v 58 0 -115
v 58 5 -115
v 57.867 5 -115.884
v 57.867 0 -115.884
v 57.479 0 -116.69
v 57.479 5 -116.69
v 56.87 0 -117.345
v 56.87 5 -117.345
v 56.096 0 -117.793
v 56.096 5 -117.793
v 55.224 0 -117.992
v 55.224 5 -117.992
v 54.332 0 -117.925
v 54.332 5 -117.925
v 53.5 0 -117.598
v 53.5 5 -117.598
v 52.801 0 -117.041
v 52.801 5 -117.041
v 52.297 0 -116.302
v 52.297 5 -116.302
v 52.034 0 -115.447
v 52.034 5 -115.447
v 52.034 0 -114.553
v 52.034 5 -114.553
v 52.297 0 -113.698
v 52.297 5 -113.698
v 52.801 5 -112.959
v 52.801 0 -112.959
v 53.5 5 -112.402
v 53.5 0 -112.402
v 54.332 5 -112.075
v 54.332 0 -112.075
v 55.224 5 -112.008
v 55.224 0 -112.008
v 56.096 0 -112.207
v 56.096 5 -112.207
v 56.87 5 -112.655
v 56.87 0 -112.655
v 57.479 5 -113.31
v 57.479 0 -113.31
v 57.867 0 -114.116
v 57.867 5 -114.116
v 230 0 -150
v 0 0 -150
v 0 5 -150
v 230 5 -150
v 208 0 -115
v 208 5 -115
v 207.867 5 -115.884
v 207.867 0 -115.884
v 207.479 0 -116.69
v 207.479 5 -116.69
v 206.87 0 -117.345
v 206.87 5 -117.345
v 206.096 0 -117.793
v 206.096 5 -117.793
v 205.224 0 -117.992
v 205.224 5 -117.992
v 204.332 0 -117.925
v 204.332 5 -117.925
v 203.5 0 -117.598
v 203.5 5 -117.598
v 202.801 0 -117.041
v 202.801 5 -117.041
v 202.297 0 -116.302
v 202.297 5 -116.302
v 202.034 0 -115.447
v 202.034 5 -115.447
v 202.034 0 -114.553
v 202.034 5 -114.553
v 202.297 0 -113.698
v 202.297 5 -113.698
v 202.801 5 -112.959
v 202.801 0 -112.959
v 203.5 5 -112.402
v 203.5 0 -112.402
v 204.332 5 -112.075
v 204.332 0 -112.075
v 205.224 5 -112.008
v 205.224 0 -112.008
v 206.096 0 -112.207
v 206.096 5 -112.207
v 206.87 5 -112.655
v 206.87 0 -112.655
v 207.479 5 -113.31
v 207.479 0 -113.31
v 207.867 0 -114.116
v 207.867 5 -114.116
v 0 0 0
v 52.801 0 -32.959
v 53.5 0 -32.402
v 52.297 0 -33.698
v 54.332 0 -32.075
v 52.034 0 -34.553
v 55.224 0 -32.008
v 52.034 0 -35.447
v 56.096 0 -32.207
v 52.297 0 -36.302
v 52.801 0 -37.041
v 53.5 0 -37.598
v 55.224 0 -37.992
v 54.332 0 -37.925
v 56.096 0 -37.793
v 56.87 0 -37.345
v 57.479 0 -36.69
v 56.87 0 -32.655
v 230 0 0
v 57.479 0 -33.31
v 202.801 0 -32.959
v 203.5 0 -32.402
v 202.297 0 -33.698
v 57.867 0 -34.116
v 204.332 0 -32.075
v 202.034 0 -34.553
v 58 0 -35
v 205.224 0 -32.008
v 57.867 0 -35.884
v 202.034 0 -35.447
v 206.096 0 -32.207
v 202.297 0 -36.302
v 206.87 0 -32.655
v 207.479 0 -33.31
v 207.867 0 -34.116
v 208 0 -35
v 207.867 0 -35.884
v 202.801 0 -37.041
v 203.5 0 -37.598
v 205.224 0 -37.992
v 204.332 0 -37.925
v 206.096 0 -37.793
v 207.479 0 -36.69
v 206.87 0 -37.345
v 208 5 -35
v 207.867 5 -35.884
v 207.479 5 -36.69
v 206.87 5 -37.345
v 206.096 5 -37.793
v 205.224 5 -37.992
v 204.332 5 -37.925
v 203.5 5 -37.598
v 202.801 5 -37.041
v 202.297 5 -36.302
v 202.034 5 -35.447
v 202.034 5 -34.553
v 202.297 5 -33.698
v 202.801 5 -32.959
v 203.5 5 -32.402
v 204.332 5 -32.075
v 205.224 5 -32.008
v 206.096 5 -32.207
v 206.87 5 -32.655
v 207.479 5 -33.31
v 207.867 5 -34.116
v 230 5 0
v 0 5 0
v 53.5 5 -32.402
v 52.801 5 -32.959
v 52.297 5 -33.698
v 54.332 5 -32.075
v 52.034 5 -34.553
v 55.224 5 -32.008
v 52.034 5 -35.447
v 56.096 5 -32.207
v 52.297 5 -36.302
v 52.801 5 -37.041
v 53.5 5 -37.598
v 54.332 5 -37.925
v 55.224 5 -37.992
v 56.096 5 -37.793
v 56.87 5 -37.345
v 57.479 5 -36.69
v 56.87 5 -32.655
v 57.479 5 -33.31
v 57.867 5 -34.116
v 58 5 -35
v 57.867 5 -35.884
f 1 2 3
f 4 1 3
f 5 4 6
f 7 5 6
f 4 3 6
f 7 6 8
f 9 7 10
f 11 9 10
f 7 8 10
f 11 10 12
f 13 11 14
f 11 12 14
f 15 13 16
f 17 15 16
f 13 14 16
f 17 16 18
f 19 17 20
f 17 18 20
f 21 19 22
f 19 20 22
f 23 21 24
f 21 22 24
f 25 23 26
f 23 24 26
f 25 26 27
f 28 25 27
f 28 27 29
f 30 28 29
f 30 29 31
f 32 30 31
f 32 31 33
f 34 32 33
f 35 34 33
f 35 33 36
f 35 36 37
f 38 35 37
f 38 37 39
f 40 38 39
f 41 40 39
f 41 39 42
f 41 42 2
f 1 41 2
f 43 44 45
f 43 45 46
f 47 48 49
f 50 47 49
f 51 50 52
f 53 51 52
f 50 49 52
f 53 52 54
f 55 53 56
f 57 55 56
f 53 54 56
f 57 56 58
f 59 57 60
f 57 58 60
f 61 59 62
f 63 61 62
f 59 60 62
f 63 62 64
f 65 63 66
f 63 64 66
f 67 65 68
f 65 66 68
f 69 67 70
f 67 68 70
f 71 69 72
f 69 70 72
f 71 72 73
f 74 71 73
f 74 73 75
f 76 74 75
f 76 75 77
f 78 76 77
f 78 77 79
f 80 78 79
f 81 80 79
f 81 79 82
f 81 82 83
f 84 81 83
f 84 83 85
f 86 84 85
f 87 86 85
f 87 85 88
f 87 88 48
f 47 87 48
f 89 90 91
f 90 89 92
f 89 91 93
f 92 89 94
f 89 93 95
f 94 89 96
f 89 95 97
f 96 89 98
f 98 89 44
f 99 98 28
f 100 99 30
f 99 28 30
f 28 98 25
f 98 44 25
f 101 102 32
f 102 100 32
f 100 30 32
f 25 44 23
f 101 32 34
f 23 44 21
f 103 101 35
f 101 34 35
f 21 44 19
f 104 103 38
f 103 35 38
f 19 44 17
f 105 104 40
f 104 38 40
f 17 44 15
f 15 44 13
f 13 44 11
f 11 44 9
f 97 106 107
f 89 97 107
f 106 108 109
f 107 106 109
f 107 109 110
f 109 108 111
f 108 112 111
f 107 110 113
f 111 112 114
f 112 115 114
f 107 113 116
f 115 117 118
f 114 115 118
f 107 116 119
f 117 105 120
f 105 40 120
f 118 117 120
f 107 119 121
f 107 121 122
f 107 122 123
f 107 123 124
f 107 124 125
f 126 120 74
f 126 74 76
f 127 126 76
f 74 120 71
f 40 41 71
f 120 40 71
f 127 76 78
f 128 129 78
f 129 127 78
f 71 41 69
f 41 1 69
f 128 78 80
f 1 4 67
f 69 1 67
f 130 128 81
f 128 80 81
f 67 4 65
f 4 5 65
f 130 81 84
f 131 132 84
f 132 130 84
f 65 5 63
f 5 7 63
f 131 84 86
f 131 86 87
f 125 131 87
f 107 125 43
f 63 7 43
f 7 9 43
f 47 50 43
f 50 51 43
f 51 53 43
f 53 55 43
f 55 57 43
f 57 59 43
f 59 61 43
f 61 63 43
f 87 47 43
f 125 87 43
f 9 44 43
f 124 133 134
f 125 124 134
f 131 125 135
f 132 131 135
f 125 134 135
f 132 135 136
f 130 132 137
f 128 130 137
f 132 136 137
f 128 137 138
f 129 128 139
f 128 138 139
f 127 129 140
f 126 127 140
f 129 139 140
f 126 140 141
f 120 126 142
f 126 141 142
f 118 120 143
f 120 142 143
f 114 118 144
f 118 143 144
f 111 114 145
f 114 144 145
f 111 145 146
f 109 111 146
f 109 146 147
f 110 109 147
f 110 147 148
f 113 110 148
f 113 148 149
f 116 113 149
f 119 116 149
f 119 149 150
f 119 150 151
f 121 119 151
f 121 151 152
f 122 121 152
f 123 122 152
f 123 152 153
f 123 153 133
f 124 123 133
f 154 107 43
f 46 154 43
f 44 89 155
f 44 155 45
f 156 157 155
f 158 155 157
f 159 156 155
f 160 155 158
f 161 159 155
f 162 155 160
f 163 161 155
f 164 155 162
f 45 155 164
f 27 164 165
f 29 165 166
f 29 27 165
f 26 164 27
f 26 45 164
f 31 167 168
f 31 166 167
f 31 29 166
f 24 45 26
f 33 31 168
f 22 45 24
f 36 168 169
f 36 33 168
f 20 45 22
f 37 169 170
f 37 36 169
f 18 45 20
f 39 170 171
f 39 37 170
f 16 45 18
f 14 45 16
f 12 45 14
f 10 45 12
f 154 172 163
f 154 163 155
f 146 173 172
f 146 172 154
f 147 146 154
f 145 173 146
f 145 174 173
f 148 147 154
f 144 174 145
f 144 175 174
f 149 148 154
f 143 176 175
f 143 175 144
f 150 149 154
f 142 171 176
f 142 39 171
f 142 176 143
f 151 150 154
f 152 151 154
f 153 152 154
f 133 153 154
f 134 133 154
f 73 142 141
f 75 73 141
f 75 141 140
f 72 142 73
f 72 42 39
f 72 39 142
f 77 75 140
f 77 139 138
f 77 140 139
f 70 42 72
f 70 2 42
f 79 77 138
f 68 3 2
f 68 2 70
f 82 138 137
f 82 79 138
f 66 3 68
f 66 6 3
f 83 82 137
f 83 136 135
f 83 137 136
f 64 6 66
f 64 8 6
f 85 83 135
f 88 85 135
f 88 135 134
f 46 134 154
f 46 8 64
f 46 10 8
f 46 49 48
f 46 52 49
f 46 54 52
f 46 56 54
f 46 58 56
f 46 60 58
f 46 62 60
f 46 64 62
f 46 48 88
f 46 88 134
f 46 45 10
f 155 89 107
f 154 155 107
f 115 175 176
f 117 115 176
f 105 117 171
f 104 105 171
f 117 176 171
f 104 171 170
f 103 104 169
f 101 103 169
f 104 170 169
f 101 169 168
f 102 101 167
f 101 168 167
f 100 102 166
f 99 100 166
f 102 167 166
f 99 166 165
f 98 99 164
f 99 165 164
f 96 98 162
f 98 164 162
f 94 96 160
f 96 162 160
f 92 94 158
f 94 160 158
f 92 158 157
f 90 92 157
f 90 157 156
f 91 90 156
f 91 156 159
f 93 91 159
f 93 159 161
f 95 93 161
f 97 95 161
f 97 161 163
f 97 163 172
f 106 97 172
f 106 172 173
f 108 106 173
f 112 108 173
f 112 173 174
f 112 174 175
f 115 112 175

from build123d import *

# Parameters (mm, degrees)
SKETCH1_W           = 230
SKETCH1_H           = 150
BOSS_EXTRUDE1_DEPTH = 5
SKETCH3_R           = 3
CUT_EXTRUDE2_DEPTH  = 6
SKETCH4_R           = 3
CUT_EXTRUDE3_DEPTH  = 10


with BuildPart() as part:
    # Sketch1 → Boss-Extrude1 (new body)
    with BuildSketch(Plane(origin=(0, 0, 0), x_dir=(1, 0, 0), z_dir=(0, 1, 0))):
        with Locations((115, 75)):
            Rectangle(SKETCH1_W, SKETCH1_H)
    extrude(amount=BOSS_EXTRUDE1_DEPTH)

    # Sketch3 → Cut-Extrude2 (cut, through all)
    with BuildSketch(Plane(origin=(0, 5, 0), x_dir=(1, 0, 0), z_dir=(0, 1, 0))):
        with Locations((205, 35)):
            Circle(SKETCH3_R)
        with Locations((205, 115)):
            Circle(SKETCH3_R)
    extrude(amount=-CUT_EXTRUDE2_DEPTH, mode=Mode.SUBTRACT)

    # Sketch4 → Cut-Extrude3 (cut)
    with BuildSketch(Plane(origin=(0, 5, 0), x_dir=(1, 0, 0), z_dir=(0, 1, 0))):
        with Locations((55, 115)):
            Circle(SKETCH4_R)
        with Locations((55, 35)):
            Circle(SKETCH4_R)
    extrude(amount=-CUT_EXTRUDE3_DEPTH, mode=Mode.SUBTRACT)


solid = part.part
